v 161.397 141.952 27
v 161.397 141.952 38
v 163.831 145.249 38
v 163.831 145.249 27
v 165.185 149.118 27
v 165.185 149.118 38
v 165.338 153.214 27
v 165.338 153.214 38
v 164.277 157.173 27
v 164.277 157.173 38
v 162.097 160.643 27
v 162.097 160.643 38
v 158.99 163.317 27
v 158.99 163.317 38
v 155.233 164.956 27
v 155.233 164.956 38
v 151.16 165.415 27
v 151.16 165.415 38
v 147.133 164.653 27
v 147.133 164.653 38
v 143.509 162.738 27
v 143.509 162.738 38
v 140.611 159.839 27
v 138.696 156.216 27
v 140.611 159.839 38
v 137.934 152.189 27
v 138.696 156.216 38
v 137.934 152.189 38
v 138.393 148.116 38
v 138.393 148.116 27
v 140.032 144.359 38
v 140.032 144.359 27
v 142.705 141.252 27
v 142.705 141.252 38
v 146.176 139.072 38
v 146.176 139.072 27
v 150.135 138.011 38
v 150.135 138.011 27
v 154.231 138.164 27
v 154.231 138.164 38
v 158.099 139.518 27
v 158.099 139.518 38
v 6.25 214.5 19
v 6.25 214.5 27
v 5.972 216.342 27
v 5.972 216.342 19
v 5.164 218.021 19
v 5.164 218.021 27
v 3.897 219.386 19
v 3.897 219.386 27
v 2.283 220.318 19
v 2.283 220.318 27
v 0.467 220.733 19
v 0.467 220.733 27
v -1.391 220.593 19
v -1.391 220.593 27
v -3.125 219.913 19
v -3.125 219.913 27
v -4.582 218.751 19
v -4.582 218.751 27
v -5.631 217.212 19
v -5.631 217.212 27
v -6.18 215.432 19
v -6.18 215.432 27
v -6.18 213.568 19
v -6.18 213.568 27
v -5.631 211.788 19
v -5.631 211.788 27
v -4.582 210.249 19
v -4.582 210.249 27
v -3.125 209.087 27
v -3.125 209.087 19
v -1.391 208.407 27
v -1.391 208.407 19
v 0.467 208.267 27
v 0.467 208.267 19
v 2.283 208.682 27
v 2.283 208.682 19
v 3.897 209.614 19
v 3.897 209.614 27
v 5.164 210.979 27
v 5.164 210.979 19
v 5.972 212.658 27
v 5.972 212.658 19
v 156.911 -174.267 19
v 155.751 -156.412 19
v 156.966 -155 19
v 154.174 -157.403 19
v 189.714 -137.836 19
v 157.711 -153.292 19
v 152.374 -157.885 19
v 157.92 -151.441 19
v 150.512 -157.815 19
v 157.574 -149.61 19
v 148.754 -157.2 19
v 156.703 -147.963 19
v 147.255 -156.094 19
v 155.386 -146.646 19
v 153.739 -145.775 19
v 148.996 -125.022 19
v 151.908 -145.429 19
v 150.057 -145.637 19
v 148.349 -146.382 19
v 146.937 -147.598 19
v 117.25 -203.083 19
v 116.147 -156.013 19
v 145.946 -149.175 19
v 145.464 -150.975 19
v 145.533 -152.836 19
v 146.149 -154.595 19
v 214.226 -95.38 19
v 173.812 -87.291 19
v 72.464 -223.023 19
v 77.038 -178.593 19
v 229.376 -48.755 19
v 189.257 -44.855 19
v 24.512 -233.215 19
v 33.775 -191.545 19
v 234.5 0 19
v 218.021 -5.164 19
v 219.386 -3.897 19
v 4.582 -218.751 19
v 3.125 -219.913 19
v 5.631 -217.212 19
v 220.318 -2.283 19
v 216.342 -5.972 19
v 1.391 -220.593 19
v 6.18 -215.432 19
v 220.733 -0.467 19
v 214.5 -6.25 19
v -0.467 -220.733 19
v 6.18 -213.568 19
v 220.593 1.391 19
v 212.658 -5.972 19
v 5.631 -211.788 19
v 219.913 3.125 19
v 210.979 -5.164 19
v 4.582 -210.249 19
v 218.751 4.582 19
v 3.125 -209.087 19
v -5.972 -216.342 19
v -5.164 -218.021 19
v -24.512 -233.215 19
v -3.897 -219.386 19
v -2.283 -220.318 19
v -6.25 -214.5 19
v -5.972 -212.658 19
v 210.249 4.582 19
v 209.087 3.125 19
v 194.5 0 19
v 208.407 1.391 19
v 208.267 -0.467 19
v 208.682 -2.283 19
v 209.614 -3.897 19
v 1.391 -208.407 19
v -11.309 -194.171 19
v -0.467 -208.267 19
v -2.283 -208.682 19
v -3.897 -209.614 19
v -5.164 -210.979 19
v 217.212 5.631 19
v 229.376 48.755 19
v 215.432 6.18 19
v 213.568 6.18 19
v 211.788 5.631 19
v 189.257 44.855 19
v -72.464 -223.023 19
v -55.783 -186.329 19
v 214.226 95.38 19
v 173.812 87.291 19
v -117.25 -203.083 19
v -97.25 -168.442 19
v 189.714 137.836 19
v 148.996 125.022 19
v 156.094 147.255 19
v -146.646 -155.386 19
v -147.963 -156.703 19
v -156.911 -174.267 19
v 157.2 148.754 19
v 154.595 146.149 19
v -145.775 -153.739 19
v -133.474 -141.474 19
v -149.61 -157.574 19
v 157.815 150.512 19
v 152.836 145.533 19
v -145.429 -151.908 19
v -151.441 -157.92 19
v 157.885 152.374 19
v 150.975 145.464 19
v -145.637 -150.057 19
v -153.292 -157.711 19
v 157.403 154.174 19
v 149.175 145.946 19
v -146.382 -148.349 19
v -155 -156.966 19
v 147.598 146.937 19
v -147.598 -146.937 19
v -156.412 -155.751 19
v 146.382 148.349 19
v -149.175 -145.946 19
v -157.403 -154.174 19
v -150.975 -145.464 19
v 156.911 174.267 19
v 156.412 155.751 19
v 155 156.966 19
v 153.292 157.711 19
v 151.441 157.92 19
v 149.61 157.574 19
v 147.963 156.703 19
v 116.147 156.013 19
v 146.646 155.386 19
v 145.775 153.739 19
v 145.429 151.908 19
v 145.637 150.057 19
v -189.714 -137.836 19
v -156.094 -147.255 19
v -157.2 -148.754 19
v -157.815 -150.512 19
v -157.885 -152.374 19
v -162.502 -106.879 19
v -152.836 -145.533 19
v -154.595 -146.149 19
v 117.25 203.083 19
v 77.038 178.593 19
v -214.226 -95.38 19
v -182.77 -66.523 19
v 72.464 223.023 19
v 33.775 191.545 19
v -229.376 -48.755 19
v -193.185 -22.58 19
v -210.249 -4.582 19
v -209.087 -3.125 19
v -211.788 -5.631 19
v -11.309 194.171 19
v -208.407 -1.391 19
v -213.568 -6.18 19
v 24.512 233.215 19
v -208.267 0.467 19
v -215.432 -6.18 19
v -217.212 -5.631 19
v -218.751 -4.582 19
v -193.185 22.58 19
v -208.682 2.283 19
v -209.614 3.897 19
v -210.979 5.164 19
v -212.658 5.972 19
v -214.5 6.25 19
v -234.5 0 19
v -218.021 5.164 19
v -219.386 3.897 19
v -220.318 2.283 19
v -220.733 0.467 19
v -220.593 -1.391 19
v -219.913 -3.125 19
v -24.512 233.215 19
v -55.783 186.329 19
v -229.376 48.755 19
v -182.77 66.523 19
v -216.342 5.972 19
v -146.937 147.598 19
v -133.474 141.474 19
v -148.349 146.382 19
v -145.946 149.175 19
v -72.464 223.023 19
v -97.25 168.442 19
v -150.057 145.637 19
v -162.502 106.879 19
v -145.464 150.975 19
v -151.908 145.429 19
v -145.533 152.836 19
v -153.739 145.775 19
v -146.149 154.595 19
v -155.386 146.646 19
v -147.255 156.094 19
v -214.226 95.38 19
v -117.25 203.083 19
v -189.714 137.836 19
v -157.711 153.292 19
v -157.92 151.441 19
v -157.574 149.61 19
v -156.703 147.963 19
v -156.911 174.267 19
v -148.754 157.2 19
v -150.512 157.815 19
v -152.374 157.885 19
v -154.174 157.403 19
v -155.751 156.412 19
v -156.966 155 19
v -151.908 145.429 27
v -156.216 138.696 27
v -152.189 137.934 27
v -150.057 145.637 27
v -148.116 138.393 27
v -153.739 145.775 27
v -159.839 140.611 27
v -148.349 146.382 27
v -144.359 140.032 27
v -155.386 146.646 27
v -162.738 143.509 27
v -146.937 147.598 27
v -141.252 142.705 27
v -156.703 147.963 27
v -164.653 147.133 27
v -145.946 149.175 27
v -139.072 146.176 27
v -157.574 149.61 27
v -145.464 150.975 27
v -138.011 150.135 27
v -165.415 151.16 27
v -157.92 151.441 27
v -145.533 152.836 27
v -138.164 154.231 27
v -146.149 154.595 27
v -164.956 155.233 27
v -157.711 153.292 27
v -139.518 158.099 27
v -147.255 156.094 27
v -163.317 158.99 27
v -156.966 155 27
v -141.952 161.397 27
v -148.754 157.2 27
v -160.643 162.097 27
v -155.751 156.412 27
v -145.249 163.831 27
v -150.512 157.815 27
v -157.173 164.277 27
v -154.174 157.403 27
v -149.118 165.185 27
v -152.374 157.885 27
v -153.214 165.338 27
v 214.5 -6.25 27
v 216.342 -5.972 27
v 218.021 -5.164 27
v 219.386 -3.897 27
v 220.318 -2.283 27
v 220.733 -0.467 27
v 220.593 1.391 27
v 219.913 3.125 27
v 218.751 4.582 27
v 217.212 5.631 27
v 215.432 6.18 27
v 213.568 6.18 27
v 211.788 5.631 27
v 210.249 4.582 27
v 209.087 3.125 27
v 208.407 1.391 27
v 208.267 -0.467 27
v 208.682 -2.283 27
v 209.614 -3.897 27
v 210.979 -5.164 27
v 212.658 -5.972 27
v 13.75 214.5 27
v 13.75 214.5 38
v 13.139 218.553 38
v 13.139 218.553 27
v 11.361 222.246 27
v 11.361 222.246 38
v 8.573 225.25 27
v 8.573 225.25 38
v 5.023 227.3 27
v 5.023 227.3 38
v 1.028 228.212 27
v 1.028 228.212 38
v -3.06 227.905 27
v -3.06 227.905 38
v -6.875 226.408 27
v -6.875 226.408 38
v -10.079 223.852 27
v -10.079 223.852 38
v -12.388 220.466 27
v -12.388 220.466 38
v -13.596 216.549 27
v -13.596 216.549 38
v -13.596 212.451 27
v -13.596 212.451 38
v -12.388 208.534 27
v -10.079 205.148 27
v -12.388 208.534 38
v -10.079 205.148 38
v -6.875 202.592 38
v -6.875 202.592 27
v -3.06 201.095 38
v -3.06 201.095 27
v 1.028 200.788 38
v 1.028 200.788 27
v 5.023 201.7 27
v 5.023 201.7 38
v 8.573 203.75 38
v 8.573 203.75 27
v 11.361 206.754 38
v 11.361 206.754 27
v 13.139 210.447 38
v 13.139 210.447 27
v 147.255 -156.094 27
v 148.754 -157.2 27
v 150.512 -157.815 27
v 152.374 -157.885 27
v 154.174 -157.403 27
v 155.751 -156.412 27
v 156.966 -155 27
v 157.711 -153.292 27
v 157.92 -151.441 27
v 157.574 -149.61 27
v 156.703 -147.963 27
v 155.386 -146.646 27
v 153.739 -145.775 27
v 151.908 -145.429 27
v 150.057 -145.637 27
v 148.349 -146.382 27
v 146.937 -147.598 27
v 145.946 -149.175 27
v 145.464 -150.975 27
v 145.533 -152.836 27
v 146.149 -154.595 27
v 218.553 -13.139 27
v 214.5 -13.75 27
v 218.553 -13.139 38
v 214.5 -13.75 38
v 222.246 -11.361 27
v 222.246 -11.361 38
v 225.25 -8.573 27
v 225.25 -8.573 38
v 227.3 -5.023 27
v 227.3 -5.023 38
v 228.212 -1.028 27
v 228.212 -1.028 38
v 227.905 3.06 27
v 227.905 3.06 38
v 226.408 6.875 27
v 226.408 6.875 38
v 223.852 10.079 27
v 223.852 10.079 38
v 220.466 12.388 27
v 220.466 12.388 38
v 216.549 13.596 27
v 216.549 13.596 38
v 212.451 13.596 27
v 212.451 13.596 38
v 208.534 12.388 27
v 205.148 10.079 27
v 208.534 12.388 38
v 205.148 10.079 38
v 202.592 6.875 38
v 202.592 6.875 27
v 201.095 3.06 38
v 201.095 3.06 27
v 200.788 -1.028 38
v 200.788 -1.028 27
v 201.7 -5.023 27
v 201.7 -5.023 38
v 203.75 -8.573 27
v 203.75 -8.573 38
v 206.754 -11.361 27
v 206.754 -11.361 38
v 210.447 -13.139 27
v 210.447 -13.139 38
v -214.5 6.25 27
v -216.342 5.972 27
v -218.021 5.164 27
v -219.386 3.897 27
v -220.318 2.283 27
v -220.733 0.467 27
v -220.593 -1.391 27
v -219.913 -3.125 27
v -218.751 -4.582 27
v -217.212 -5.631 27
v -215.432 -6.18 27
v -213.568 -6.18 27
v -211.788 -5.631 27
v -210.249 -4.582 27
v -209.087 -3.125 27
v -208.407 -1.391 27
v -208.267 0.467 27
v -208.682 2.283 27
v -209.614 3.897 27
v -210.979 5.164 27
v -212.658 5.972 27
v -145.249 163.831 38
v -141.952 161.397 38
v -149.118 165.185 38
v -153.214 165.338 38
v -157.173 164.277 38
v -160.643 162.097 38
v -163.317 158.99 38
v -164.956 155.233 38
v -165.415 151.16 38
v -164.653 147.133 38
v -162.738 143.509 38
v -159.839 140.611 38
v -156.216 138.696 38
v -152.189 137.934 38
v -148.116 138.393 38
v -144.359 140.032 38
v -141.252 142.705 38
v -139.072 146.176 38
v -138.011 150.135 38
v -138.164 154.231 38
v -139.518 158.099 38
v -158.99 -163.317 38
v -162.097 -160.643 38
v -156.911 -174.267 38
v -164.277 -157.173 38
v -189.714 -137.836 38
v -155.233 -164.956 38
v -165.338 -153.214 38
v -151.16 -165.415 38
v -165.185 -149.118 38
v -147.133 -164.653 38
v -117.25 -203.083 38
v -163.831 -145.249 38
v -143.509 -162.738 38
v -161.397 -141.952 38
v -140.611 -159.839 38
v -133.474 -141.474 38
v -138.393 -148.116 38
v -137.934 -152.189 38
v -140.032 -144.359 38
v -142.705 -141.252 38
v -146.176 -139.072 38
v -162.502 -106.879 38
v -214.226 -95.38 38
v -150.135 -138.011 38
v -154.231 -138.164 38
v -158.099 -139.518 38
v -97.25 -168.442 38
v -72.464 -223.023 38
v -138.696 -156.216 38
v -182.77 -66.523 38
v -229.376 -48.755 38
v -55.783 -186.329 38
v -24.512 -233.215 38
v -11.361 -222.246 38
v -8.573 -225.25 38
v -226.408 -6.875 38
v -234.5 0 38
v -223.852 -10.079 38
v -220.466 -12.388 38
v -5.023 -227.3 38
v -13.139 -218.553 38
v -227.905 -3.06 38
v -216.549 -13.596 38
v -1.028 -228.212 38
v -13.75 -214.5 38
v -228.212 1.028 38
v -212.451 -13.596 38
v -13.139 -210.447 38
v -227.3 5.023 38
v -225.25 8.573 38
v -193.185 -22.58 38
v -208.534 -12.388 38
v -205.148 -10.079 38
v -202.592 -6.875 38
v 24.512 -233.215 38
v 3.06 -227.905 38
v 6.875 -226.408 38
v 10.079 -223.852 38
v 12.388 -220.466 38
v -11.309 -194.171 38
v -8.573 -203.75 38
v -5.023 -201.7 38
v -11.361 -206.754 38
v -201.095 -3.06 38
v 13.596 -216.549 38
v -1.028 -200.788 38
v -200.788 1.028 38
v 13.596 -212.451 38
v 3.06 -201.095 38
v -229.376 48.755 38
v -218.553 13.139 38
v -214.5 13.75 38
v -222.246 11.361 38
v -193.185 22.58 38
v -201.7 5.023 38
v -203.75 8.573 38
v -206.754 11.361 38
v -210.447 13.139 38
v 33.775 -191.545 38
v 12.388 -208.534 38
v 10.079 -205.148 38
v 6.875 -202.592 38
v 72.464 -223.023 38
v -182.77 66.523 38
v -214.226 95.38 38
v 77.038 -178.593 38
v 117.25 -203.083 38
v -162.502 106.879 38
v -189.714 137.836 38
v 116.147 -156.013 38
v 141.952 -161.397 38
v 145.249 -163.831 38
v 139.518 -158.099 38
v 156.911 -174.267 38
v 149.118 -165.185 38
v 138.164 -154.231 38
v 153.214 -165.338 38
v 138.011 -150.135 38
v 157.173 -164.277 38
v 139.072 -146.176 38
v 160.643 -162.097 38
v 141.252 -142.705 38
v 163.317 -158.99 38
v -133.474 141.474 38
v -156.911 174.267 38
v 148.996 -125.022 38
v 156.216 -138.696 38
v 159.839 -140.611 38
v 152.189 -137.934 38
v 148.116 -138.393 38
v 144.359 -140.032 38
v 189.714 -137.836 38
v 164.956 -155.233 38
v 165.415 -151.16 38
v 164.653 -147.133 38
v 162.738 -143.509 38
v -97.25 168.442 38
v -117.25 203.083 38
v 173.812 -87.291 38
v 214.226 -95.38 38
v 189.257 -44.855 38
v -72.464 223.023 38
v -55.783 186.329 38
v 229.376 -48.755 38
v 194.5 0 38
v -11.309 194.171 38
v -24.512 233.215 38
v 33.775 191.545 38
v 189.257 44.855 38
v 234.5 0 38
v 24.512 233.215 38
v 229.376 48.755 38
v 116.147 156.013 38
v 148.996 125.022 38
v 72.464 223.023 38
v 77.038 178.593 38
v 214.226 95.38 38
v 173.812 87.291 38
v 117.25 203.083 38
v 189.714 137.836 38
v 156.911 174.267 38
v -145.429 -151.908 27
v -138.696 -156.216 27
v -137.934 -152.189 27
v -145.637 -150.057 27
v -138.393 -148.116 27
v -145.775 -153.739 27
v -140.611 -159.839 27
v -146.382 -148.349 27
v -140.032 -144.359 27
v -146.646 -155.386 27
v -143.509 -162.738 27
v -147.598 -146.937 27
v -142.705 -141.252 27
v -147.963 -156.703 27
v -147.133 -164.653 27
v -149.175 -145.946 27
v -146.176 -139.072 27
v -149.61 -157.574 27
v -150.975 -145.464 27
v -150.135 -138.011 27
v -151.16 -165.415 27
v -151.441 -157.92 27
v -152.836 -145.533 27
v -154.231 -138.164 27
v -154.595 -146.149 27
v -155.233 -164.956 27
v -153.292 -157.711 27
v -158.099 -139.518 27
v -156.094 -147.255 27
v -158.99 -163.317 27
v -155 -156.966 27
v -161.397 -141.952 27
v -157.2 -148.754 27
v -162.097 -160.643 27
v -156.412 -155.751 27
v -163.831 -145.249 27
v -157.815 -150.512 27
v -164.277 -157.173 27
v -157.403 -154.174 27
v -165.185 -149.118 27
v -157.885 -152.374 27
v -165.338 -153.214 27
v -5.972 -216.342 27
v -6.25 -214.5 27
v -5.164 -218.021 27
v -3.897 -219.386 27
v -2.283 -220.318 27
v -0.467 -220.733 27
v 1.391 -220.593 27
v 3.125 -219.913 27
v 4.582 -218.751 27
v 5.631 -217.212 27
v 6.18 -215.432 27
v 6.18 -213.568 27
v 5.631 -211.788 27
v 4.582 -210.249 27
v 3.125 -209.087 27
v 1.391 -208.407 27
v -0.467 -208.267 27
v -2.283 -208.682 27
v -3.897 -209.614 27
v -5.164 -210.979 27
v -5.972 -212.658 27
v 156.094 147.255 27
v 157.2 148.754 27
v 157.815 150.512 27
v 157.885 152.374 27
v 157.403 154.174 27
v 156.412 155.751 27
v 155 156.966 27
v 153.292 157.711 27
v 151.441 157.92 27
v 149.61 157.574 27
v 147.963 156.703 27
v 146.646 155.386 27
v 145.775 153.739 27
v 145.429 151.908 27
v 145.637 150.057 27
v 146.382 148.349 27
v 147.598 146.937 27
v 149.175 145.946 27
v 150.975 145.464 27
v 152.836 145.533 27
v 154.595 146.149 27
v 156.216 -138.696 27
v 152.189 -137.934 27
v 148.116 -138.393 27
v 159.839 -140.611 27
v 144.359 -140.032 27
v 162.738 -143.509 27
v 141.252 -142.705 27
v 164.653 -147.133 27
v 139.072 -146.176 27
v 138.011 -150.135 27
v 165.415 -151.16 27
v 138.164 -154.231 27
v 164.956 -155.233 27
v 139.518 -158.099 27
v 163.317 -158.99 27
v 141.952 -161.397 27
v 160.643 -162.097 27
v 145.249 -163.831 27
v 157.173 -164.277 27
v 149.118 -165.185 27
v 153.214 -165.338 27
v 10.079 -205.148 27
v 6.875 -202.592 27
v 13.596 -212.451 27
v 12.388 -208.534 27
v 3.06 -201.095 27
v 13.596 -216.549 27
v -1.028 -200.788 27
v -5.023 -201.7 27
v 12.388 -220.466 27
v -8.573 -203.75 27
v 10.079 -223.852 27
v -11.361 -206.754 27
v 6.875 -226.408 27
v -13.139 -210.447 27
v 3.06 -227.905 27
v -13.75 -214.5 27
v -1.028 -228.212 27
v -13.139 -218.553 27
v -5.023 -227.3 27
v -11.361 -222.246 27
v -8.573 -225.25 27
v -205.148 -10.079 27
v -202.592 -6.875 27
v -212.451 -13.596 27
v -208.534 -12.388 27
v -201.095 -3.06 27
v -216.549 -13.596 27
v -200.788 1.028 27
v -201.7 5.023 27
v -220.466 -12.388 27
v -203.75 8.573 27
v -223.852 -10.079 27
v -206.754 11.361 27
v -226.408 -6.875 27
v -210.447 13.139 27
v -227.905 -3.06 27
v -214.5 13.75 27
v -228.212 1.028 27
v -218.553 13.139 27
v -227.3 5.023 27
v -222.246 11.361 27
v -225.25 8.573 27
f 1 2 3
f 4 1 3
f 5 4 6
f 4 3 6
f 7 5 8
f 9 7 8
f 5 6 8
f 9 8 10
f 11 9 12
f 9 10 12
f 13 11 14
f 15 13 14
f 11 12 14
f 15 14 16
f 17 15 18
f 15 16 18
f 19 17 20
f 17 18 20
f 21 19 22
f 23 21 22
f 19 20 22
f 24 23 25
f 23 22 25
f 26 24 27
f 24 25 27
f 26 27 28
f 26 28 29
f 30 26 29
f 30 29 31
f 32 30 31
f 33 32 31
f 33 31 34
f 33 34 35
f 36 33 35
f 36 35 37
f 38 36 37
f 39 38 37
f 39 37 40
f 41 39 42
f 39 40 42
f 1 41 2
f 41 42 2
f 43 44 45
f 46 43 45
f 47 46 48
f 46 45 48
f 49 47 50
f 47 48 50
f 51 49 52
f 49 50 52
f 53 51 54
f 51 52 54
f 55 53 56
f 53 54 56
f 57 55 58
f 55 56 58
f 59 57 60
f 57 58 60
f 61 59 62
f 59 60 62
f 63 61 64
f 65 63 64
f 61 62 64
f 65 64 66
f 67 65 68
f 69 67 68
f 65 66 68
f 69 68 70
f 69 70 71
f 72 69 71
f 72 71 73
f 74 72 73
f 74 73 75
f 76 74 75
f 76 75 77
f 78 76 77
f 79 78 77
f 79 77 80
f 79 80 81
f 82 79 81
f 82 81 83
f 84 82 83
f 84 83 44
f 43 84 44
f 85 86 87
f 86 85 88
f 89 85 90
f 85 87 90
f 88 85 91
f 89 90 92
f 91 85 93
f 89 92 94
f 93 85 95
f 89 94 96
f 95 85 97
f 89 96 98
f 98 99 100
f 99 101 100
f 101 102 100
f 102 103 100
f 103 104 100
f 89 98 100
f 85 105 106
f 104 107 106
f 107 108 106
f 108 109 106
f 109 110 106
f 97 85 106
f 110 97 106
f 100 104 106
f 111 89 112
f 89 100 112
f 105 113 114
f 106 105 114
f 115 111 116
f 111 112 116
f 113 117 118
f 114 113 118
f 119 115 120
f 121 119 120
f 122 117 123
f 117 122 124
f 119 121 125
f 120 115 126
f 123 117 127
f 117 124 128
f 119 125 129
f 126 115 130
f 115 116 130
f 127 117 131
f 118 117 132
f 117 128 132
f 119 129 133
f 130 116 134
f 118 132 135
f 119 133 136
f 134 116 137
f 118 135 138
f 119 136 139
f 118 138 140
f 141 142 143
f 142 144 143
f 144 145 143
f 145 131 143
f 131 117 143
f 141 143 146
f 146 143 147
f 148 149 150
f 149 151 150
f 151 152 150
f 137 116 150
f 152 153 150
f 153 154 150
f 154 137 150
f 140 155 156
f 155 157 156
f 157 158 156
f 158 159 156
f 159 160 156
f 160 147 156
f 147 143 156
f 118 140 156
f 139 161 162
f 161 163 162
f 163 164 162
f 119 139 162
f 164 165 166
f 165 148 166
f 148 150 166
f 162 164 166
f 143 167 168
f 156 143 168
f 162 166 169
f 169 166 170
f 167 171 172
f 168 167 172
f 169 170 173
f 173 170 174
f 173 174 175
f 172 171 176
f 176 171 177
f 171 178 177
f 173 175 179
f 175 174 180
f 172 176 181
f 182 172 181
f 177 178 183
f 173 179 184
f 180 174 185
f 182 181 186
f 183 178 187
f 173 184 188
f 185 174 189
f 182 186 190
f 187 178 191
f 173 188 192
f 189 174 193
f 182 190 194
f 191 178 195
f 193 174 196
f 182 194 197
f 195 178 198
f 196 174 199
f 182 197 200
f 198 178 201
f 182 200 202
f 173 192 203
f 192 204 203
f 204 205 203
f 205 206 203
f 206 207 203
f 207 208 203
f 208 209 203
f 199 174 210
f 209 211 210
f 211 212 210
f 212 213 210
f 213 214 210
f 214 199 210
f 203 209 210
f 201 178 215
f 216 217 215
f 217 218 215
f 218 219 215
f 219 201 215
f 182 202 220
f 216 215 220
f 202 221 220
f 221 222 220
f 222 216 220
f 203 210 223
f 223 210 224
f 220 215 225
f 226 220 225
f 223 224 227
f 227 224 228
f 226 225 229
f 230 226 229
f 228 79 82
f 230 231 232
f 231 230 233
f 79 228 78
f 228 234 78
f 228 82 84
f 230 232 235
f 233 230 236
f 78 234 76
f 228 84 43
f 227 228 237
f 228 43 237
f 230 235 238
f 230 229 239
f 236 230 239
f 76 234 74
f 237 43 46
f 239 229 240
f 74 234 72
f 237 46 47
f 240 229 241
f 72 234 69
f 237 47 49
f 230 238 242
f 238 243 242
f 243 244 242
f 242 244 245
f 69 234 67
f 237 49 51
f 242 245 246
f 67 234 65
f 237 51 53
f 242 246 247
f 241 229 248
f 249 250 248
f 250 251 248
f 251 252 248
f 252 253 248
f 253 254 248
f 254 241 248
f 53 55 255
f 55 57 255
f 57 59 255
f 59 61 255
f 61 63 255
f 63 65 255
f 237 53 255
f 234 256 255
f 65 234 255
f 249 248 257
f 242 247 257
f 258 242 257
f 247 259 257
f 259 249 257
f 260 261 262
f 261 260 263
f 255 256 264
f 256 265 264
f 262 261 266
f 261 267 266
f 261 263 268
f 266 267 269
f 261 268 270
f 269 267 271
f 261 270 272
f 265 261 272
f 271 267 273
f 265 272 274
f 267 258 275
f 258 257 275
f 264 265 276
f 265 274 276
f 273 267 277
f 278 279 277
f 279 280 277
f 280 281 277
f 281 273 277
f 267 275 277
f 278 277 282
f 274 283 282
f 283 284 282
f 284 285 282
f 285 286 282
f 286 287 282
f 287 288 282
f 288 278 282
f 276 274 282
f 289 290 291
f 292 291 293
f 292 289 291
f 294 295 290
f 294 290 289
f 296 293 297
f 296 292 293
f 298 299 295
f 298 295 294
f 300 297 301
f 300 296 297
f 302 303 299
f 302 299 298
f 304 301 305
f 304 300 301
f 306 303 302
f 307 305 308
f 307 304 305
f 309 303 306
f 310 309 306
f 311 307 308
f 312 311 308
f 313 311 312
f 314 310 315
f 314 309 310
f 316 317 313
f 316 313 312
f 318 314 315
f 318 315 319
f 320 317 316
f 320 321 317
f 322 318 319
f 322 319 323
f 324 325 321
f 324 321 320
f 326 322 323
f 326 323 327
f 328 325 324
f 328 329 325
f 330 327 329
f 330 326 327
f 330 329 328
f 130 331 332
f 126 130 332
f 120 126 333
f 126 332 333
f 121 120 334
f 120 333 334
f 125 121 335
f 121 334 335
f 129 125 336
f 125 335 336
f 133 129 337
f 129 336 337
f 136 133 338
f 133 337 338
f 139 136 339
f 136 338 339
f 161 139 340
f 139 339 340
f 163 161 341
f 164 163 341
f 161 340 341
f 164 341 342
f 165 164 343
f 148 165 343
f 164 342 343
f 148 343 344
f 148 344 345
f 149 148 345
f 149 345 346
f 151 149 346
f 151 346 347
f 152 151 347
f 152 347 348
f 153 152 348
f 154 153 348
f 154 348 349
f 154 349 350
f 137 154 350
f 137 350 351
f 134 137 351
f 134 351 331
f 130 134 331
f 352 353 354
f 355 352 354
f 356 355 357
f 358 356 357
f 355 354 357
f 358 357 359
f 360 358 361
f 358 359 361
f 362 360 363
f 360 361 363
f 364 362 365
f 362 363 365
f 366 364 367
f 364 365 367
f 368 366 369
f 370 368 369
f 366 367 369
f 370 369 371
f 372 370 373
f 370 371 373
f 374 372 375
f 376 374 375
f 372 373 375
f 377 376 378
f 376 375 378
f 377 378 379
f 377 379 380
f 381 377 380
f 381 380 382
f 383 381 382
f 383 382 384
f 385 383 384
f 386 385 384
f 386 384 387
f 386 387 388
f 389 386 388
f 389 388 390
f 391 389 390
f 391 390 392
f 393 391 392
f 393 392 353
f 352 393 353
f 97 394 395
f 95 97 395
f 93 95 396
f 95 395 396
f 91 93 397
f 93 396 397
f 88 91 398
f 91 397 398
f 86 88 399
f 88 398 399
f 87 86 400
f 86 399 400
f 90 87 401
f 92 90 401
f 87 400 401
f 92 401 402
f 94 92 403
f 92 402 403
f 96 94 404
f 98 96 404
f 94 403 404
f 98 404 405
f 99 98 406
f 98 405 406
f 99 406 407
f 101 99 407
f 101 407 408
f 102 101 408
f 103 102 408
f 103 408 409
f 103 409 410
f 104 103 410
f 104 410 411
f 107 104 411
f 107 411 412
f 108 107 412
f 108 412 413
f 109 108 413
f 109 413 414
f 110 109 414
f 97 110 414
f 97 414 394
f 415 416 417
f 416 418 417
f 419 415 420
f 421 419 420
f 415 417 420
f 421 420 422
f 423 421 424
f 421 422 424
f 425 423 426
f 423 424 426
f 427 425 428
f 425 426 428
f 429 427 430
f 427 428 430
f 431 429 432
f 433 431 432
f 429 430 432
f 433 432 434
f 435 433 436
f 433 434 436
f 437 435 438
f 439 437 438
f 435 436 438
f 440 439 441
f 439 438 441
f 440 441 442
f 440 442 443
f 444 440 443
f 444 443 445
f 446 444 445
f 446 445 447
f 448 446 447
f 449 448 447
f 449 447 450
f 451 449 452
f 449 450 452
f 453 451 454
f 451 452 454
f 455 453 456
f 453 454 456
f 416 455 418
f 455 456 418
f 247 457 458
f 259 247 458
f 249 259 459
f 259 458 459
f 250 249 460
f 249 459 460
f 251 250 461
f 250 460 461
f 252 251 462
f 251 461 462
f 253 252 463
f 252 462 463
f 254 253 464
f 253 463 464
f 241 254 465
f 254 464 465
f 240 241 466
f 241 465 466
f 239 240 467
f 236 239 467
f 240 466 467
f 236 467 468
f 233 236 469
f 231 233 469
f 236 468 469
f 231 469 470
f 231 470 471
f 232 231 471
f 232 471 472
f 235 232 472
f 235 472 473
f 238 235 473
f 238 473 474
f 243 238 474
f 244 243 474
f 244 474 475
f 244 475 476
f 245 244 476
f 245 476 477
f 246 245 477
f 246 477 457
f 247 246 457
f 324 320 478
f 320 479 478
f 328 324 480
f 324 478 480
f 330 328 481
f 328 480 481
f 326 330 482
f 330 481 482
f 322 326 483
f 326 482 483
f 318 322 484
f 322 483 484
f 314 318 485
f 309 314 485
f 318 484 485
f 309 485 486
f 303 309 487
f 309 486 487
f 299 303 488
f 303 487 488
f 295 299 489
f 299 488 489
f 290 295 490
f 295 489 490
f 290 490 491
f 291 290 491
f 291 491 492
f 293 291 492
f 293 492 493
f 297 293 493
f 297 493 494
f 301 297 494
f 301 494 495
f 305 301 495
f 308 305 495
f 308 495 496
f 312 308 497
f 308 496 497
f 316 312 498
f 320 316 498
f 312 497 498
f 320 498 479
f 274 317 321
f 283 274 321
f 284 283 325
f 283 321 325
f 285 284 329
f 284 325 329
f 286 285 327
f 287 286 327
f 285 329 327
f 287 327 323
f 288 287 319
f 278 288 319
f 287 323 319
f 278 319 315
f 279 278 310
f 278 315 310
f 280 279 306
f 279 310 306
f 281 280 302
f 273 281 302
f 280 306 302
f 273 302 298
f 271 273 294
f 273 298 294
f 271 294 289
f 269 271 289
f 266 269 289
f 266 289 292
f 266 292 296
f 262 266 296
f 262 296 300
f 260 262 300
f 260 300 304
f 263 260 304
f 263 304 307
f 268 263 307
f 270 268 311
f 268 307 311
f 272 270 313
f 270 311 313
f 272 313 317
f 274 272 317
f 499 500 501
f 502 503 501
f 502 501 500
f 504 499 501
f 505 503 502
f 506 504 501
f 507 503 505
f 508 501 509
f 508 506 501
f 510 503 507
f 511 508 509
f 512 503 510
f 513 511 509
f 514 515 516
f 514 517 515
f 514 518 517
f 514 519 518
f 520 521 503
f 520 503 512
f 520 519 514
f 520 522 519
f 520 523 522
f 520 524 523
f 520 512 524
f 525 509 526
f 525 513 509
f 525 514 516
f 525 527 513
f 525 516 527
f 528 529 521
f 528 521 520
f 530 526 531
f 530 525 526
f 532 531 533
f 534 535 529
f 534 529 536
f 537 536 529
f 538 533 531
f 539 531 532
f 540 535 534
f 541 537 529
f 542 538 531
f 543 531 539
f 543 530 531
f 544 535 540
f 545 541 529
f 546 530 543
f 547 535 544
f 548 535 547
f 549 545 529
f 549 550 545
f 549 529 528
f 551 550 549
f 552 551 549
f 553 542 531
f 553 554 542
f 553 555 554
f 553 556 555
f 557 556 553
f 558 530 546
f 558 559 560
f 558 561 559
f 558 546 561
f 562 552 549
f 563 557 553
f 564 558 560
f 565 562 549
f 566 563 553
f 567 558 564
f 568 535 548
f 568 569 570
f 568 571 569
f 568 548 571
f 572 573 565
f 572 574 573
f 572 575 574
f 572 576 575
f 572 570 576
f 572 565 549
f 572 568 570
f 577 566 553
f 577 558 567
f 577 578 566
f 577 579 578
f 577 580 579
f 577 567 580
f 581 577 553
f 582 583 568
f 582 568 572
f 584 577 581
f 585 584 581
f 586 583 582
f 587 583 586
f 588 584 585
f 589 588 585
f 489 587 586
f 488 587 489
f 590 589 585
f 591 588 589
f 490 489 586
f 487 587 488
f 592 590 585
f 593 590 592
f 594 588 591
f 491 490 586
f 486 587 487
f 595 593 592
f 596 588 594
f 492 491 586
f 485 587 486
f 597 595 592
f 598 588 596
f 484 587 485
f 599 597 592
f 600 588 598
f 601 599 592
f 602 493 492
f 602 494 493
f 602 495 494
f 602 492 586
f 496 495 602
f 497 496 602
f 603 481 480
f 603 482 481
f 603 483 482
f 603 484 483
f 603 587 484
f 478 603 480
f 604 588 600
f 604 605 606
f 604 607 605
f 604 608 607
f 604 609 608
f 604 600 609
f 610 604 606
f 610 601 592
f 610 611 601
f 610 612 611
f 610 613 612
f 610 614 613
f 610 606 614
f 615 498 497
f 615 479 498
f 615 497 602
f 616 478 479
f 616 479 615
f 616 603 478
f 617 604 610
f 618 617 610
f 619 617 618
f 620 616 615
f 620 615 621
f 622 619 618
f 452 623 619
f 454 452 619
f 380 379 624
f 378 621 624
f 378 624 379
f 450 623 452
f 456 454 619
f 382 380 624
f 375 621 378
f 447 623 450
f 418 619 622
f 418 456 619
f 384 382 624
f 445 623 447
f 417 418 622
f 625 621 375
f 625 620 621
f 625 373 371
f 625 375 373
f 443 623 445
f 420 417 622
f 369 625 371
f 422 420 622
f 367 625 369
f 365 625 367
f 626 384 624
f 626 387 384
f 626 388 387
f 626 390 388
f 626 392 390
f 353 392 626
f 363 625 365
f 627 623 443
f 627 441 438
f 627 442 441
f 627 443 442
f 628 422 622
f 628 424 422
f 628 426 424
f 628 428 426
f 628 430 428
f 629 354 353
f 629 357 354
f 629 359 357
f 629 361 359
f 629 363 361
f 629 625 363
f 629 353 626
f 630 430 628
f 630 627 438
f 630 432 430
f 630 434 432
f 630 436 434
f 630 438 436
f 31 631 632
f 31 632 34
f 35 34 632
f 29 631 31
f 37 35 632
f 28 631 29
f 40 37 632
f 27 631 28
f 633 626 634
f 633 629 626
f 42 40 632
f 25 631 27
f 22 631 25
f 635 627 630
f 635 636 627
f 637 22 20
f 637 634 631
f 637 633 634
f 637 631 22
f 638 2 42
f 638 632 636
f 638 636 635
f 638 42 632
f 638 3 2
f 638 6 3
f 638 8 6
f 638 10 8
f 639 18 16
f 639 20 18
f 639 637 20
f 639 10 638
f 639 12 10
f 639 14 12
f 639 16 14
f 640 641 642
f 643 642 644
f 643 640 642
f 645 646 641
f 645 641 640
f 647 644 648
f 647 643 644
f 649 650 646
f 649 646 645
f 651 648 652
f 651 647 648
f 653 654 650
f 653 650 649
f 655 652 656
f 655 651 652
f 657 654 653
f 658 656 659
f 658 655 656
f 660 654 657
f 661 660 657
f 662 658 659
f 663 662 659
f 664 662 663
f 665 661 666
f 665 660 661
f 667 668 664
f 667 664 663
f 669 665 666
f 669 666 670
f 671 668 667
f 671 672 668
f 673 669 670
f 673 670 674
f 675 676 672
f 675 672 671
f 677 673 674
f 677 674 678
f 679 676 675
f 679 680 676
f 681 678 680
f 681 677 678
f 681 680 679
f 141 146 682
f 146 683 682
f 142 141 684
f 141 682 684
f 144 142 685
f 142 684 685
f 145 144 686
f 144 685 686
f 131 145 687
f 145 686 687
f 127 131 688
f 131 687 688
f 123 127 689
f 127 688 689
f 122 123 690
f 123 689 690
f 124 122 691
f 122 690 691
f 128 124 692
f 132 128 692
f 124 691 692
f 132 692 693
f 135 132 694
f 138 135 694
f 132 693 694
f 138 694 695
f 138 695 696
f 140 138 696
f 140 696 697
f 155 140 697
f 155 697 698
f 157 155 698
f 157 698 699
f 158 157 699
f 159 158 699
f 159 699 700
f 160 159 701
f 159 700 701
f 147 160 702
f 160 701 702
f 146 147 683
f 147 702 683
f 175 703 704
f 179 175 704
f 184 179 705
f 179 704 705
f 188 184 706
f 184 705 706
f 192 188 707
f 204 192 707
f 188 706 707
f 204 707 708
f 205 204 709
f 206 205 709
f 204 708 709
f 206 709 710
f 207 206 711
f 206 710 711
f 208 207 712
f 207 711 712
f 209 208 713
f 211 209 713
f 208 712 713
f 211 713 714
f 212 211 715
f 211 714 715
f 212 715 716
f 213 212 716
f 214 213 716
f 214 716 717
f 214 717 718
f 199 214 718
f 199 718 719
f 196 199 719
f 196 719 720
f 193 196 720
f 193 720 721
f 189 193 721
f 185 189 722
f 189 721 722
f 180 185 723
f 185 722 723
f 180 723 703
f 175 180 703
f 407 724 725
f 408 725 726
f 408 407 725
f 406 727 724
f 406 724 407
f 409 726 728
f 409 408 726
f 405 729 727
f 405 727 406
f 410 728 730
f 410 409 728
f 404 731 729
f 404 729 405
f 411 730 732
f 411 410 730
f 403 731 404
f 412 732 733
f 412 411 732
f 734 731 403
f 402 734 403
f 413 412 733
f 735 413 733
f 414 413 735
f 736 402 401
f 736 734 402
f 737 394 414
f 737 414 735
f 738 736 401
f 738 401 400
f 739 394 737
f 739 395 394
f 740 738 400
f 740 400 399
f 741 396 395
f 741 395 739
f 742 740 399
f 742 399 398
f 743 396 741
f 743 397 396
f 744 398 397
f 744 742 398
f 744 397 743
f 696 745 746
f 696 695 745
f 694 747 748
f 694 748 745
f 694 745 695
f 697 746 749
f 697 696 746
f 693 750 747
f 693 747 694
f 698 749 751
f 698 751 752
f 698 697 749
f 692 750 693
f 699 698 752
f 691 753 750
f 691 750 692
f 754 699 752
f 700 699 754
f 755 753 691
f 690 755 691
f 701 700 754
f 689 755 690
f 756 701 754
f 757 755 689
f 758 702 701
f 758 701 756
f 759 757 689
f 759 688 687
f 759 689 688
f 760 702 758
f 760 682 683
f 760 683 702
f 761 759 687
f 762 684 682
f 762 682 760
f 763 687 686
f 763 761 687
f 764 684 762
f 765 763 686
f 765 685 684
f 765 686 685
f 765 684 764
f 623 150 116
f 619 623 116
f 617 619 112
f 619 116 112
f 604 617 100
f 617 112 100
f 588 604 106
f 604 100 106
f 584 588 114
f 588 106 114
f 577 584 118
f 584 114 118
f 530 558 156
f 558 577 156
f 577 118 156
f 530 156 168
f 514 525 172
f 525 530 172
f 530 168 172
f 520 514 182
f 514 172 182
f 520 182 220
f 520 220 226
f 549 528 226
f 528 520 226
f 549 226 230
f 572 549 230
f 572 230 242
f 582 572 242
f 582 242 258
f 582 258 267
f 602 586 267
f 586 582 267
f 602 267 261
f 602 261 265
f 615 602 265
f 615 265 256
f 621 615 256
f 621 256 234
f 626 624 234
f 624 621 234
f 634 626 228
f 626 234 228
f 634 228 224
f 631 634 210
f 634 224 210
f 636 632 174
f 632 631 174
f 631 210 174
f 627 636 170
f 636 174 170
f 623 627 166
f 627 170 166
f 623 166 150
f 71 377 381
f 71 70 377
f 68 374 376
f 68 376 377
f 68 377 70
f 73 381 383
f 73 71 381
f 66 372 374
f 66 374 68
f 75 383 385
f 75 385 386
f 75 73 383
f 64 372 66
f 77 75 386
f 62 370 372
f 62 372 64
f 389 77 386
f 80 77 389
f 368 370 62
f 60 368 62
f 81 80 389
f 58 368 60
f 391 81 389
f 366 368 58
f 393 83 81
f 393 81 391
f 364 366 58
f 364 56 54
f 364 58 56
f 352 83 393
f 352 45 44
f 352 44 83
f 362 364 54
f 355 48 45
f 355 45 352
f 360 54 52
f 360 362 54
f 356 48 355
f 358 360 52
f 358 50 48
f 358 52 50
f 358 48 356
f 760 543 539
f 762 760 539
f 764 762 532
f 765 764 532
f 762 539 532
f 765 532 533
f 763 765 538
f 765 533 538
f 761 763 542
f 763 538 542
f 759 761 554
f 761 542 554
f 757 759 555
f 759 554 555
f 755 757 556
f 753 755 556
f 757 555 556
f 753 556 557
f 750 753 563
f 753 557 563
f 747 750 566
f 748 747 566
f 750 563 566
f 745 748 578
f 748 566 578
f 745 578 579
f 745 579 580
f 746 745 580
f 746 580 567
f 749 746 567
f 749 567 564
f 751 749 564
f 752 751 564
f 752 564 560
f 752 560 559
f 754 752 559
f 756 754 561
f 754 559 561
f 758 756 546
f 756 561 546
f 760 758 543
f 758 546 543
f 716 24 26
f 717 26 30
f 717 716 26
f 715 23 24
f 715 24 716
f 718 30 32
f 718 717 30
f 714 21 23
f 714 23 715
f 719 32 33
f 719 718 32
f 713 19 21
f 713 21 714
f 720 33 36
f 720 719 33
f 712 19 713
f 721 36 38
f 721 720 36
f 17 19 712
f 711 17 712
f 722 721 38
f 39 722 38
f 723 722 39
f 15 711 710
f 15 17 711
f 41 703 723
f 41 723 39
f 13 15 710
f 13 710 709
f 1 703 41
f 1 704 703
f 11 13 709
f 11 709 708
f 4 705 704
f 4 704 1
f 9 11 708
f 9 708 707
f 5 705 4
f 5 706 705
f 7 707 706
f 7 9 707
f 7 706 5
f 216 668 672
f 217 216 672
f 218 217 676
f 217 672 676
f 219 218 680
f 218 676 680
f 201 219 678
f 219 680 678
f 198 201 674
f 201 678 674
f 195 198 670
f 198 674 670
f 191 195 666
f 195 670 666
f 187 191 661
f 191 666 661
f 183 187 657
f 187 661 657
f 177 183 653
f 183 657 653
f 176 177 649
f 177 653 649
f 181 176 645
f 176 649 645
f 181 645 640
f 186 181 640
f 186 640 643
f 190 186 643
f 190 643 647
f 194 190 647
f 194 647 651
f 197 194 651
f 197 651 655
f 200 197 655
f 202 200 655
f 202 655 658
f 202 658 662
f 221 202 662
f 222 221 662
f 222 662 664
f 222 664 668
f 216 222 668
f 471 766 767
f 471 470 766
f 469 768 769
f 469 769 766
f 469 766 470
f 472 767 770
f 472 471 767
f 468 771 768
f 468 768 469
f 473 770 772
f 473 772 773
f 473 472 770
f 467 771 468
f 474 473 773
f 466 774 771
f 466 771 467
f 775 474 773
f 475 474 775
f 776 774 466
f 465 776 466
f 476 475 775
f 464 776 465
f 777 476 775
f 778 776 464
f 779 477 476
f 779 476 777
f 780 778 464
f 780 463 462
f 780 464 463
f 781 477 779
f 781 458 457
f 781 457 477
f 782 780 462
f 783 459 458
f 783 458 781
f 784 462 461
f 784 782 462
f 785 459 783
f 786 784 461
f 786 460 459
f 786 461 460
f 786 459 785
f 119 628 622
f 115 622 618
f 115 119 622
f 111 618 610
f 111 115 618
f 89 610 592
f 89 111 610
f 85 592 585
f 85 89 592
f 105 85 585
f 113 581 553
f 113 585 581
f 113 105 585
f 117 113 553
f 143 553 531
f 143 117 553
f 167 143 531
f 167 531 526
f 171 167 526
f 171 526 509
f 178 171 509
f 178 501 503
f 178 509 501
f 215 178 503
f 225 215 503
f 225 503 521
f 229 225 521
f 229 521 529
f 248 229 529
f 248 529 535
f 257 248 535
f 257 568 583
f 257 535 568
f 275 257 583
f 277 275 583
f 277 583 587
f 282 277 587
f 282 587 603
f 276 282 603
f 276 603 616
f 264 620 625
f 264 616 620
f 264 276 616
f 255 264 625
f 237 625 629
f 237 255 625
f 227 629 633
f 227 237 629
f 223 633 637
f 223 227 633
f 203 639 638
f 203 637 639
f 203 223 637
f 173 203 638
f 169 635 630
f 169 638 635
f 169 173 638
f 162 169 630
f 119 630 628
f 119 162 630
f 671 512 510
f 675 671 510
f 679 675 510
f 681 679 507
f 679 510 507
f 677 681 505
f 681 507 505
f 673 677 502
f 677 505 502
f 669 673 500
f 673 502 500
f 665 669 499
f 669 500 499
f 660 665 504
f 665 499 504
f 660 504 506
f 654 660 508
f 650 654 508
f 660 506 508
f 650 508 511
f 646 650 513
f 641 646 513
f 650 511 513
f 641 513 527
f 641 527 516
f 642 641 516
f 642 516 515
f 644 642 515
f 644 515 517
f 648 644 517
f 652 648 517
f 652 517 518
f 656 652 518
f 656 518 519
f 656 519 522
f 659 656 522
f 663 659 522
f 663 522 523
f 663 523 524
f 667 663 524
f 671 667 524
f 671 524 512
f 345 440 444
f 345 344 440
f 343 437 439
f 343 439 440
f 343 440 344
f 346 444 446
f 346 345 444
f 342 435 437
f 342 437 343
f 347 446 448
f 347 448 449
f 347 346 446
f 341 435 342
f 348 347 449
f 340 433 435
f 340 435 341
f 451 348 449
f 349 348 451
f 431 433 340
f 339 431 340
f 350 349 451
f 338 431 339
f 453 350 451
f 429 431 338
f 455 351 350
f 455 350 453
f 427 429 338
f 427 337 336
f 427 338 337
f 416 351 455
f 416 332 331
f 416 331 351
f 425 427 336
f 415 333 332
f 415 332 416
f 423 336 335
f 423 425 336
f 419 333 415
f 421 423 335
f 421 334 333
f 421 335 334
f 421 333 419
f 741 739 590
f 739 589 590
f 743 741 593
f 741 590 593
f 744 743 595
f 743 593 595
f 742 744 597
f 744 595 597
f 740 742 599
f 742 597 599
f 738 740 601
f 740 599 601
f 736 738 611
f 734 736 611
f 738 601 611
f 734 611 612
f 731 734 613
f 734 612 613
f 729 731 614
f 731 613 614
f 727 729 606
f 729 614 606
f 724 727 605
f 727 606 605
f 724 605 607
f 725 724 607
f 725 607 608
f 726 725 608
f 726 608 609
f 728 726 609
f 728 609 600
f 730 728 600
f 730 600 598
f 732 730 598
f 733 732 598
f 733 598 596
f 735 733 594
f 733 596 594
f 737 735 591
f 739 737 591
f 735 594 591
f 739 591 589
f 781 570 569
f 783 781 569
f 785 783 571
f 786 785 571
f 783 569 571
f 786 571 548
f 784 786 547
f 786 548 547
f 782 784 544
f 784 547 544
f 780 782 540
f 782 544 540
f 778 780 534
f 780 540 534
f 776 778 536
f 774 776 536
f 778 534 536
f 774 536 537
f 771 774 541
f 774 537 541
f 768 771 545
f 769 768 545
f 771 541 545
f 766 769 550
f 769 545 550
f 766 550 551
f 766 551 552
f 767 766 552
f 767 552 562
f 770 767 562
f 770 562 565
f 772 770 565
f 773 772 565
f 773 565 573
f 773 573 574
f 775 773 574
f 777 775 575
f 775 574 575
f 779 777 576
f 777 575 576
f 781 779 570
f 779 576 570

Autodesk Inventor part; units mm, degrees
ref_plane "YZ Plane" through (0, 0, 0) normal (1, 0, 0) x (0, 1, 0)
ref_plane "XZ Plane" through (0, 0, 0) normal (0, 1, 0) x (-1, 0, 0)
ref_plane "XY Plane" through (0, 0, 0) normal (0, 0, 1) x (1, 0, 0)
sketch "Sketch1" plane through (0, 0, 0) normal (0, 0, 1) x (1, 0, 0)
  circle A0 centre (0, 0) radius 194.5
  circle A1 centre (0, 0) radius 234.5
  dimension "d0" = 40
  dimension "d1" = 389
extrude "Extrusion1" add sketch "Sketch1" along normal blind 38
sketch "Sketch2" plane through (0, 0, 38) normal (0, 0, 1) x (1, 0, 0)
  circle A0 centre (0, 0) radius 234.5 construction
  circle A1 centre (0, 0) radius 194.5 construction
  line L0 (0, 234.5) -> (0, 194.5) construction
  circle A2 centre (0, 214.5) radius 6.25
  dimension "d4" = 12.5
extrude "Extrusion2" cut sketch "Sketch2" against normal through all
sketch "Sketch3" plane through (0, 0, 38) normal (0, 0, 1) x (1, 0, 0)
  circle A0 centre (0, 214.5) radius 6.25 projected
  circle A1 centre (0, 214.5) radius 13.75
  point P0 (0, 0)
  dimension "d10" = 27.5
extrude "Extrusion3" cut sketch "Sketch3" against normal blind 11
pattern_circular "Circular Pattern1" count 8 over 360 about axis through (0, 0, 0) along (0, 0, 1) of "Extrusion2", "Extrusion3"
sketch "Sketch4" plane through (0, 0, 0) normal (0, 0, -1) x (-1, 0, 0)
  circle A0 centre (0, 0) radius 234.5 projected
  circle A1 centre (0, 0) radius 239.5
  dimension "d13" = 5
extrude "Extrusion4" add sketch "Sketch4" against normal blind 9
sketch "Sketch5" plane through (0, 0, 0) normal (1, 0, 0) x (0, 1, 0)
  line L0 (234.5, 9) -> (234.5, 38) projected
  line L1 (239.5, 9) -> (-239.5, 9) projected
  line L2 (239.5, 0) -> (239.5, 9) projected
  line L3 (-239.5, 0) -> (239.5, 0) projected
  line L4 (-234.5, 9) -> (-234.5, 38) projected
  line L5 (-239.5, 0) -> (-239.5, 9) projected
  line L6 (-234.5, 19) -> (234.5, 19)
  point P0 (0, 0)
  dimension "d16" = 38
  dimension "d17" = 19
extrude "Extrusion5" cut sketch "Sketch5" along normal through all both and the other way through all
equation "\"d1\" = Вал_ось_диаметр_КОРМА"
equation "\"BendRadius\" = Thickness"
equation "\"BendReliefWidth\" = Thickness"
equation "\"BendReliefDepth\" = 0.5 * Thickness"
equation "\"CornerReliefSize\" = 4 * Thickness"
equation "\"MinimumRemnant\" = 2 * Thickness"
equation "\"TransitionRadius\" = BendRadius"
equation "\"JacobiRadiusSize\" = BendRadius"
equation "\"GapSize\" = Thickness"
equation "\"Вал_ось_диаметр_КОРМА\" = 389"
equation "\"Thickness\" = 19"
properties part number "ДМФ 01 32.1 Барабан Опорное кольцо КОРМА"
